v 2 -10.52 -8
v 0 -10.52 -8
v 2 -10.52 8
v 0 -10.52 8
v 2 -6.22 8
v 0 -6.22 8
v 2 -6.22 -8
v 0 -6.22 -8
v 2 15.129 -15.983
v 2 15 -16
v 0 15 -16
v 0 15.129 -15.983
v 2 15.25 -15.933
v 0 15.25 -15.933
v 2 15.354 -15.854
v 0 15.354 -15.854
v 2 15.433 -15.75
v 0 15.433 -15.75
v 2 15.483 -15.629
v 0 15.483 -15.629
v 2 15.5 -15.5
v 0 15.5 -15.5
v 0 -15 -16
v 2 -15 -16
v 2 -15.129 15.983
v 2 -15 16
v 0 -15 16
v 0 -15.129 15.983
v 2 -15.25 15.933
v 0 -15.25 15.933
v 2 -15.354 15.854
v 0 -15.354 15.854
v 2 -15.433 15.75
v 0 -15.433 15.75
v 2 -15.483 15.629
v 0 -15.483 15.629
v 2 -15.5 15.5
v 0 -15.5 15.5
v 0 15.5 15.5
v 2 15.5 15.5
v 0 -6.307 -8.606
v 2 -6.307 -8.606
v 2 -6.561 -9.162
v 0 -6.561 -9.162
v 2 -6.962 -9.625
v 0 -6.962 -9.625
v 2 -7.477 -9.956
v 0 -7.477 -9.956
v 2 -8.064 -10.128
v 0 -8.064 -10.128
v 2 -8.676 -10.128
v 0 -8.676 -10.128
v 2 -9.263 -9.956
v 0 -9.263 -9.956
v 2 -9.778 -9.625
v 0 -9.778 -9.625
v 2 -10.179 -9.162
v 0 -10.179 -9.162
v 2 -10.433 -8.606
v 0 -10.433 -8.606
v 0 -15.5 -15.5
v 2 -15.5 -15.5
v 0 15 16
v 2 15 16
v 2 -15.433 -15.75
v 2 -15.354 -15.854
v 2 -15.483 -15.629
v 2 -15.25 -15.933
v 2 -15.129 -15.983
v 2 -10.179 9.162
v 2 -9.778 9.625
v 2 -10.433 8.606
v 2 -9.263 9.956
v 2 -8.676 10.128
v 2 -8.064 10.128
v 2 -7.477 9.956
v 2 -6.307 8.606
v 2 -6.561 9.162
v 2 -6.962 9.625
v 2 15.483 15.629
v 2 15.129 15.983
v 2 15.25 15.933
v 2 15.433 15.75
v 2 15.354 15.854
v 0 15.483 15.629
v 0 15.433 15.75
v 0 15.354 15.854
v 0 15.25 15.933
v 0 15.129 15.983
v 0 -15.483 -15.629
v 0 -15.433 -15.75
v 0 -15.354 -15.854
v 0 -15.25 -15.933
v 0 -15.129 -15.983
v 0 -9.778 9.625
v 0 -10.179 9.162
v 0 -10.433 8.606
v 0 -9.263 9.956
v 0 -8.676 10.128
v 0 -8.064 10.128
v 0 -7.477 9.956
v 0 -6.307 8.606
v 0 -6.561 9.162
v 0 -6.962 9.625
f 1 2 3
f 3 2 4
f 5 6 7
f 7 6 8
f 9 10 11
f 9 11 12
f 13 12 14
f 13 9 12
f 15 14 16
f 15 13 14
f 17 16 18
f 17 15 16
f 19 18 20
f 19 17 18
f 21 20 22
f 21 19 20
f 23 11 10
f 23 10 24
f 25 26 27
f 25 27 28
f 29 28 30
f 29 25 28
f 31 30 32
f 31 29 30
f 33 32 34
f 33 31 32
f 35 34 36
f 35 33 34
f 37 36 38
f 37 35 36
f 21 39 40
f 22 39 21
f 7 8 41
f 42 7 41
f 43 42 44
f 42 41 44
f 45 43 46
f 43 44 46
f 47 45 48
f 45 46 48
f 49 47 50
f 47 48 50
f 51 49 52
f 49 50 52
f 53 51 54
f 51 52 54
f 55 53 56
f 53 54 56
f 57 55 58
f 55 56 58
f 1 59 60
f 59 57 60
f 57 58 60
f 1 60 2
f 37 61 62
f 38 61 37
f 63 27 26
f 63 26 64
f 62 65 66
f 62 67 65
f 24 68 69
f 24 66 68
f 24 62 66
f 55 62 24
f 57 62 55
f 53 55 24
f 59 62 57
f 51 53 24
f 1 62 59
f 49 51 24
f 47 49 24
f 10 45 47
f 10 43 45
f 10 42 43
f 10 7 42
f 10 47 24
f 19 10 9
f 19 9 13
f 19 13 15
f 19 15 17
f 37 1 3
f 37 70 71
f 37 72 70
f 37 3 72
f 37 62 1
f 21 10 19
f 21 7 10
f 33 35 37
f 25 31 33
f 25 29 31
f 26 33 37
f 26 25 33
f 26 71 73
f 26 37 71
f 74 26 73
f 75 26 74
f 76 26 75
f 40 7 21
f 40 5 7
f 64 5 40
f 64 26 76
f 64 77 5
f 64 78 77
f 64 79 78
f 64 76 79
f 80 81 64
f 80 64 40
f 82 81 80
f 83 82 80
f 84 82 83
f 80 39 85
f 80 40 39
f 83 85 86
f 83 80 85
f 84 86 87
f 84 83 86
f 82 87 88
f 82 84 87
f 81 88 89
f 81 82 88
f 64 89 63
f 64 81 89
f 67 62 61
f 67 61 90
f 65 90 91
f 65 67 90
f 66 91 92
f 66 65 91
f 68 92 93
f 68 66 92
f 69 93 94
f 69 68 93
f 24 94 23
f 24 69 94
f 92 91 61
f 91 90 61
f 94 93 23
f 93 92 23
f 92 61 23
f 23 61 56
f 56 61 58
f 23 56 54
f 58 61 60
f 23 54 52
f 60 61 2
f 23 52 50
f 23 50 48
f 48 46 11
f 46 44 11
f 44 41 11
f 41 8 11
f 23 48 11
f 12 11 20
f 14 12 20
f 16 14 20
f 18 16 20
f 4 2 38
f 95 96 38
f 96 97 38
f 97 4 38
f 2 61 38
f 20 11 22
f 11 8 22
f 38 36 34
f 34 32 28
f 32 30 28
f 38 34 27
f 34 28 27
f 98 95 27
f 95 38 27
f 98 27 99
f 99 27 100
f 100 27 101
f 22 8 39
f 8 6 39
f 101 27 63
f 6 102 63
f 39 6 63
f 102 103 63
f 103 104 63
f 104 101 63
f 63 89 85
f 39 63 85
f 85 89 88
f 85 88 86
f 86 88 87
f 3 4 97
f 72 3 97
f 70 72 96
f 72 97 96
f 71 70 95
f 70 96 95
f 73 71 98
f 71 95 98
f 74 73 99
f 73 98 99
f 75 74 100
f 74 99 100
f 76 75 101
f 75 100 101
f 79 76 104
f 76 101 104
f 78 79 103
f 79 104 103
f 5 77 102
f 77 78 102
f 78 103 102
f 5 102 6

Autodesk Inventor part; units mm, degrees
ref_plane "YZ Plane" through (0, 0, 0) normal (1, 0, 0) x (0, 1, 0)
ref_plane "XZ Plane" through (0, 0, 0) normal (0, 1, 0) x (-1, 0, 0)
ref_plane "XY Plane" through (0, 0, 0) normal (0, 0, 1) x (1, 0, 0)
sketch "Sketch1" plane through (0, 0, 0) normal (1, 0, 0) x (0, 1, 0)
  line L0 (15.5, -16) -> (-15.5, -16)
  line L1 (-15.5, -16) -> (-15.5, 16)
  line L2 (-15.5, 16) -> (15.5, 16)
  line L3 (15.5, 16) -> (15.5, -16)
  line L4 (15.5, -16) -> (-15.5, 16) construction
  line L5 (-15.5, -16) -> (15.5, 16) construction
  line L6 (-8.37, 8) -> (-8.37, -8) construction
  line L7 (-6.22, 8) -> (-6.22, -8)
  line L8 (-10.52, -8) -> (-10.52, 8)
  arc A0 (-6.22, 8) -> (-10.52, 8) centre (-8.37, 8) ccw
  arc A1 (-10.52, -8) -> (-6.22, -8) centre (-8.37, -8) ccw
  point P0 (0, 0)
  point P1 (-8.37, 0)
  dimension "d0" = 31
  dimension "d1" = 32
  dimension "d5" = 7.13
  dimension "d6" = 16
  dimension "d7" = 4.3
extrude "Extrusion1" add sketch "Sketch1" along normal blind 2
fillet "Fillet1" radius 0.5 4 edges at (1, 15.5, 16) (1, -15.5, 16) (1, -15.5, -16) (1, 15.5, -16)
properties part number "3DPRINT,LIMIT_SWITCH,SPACER" material "ABS Plastic"
